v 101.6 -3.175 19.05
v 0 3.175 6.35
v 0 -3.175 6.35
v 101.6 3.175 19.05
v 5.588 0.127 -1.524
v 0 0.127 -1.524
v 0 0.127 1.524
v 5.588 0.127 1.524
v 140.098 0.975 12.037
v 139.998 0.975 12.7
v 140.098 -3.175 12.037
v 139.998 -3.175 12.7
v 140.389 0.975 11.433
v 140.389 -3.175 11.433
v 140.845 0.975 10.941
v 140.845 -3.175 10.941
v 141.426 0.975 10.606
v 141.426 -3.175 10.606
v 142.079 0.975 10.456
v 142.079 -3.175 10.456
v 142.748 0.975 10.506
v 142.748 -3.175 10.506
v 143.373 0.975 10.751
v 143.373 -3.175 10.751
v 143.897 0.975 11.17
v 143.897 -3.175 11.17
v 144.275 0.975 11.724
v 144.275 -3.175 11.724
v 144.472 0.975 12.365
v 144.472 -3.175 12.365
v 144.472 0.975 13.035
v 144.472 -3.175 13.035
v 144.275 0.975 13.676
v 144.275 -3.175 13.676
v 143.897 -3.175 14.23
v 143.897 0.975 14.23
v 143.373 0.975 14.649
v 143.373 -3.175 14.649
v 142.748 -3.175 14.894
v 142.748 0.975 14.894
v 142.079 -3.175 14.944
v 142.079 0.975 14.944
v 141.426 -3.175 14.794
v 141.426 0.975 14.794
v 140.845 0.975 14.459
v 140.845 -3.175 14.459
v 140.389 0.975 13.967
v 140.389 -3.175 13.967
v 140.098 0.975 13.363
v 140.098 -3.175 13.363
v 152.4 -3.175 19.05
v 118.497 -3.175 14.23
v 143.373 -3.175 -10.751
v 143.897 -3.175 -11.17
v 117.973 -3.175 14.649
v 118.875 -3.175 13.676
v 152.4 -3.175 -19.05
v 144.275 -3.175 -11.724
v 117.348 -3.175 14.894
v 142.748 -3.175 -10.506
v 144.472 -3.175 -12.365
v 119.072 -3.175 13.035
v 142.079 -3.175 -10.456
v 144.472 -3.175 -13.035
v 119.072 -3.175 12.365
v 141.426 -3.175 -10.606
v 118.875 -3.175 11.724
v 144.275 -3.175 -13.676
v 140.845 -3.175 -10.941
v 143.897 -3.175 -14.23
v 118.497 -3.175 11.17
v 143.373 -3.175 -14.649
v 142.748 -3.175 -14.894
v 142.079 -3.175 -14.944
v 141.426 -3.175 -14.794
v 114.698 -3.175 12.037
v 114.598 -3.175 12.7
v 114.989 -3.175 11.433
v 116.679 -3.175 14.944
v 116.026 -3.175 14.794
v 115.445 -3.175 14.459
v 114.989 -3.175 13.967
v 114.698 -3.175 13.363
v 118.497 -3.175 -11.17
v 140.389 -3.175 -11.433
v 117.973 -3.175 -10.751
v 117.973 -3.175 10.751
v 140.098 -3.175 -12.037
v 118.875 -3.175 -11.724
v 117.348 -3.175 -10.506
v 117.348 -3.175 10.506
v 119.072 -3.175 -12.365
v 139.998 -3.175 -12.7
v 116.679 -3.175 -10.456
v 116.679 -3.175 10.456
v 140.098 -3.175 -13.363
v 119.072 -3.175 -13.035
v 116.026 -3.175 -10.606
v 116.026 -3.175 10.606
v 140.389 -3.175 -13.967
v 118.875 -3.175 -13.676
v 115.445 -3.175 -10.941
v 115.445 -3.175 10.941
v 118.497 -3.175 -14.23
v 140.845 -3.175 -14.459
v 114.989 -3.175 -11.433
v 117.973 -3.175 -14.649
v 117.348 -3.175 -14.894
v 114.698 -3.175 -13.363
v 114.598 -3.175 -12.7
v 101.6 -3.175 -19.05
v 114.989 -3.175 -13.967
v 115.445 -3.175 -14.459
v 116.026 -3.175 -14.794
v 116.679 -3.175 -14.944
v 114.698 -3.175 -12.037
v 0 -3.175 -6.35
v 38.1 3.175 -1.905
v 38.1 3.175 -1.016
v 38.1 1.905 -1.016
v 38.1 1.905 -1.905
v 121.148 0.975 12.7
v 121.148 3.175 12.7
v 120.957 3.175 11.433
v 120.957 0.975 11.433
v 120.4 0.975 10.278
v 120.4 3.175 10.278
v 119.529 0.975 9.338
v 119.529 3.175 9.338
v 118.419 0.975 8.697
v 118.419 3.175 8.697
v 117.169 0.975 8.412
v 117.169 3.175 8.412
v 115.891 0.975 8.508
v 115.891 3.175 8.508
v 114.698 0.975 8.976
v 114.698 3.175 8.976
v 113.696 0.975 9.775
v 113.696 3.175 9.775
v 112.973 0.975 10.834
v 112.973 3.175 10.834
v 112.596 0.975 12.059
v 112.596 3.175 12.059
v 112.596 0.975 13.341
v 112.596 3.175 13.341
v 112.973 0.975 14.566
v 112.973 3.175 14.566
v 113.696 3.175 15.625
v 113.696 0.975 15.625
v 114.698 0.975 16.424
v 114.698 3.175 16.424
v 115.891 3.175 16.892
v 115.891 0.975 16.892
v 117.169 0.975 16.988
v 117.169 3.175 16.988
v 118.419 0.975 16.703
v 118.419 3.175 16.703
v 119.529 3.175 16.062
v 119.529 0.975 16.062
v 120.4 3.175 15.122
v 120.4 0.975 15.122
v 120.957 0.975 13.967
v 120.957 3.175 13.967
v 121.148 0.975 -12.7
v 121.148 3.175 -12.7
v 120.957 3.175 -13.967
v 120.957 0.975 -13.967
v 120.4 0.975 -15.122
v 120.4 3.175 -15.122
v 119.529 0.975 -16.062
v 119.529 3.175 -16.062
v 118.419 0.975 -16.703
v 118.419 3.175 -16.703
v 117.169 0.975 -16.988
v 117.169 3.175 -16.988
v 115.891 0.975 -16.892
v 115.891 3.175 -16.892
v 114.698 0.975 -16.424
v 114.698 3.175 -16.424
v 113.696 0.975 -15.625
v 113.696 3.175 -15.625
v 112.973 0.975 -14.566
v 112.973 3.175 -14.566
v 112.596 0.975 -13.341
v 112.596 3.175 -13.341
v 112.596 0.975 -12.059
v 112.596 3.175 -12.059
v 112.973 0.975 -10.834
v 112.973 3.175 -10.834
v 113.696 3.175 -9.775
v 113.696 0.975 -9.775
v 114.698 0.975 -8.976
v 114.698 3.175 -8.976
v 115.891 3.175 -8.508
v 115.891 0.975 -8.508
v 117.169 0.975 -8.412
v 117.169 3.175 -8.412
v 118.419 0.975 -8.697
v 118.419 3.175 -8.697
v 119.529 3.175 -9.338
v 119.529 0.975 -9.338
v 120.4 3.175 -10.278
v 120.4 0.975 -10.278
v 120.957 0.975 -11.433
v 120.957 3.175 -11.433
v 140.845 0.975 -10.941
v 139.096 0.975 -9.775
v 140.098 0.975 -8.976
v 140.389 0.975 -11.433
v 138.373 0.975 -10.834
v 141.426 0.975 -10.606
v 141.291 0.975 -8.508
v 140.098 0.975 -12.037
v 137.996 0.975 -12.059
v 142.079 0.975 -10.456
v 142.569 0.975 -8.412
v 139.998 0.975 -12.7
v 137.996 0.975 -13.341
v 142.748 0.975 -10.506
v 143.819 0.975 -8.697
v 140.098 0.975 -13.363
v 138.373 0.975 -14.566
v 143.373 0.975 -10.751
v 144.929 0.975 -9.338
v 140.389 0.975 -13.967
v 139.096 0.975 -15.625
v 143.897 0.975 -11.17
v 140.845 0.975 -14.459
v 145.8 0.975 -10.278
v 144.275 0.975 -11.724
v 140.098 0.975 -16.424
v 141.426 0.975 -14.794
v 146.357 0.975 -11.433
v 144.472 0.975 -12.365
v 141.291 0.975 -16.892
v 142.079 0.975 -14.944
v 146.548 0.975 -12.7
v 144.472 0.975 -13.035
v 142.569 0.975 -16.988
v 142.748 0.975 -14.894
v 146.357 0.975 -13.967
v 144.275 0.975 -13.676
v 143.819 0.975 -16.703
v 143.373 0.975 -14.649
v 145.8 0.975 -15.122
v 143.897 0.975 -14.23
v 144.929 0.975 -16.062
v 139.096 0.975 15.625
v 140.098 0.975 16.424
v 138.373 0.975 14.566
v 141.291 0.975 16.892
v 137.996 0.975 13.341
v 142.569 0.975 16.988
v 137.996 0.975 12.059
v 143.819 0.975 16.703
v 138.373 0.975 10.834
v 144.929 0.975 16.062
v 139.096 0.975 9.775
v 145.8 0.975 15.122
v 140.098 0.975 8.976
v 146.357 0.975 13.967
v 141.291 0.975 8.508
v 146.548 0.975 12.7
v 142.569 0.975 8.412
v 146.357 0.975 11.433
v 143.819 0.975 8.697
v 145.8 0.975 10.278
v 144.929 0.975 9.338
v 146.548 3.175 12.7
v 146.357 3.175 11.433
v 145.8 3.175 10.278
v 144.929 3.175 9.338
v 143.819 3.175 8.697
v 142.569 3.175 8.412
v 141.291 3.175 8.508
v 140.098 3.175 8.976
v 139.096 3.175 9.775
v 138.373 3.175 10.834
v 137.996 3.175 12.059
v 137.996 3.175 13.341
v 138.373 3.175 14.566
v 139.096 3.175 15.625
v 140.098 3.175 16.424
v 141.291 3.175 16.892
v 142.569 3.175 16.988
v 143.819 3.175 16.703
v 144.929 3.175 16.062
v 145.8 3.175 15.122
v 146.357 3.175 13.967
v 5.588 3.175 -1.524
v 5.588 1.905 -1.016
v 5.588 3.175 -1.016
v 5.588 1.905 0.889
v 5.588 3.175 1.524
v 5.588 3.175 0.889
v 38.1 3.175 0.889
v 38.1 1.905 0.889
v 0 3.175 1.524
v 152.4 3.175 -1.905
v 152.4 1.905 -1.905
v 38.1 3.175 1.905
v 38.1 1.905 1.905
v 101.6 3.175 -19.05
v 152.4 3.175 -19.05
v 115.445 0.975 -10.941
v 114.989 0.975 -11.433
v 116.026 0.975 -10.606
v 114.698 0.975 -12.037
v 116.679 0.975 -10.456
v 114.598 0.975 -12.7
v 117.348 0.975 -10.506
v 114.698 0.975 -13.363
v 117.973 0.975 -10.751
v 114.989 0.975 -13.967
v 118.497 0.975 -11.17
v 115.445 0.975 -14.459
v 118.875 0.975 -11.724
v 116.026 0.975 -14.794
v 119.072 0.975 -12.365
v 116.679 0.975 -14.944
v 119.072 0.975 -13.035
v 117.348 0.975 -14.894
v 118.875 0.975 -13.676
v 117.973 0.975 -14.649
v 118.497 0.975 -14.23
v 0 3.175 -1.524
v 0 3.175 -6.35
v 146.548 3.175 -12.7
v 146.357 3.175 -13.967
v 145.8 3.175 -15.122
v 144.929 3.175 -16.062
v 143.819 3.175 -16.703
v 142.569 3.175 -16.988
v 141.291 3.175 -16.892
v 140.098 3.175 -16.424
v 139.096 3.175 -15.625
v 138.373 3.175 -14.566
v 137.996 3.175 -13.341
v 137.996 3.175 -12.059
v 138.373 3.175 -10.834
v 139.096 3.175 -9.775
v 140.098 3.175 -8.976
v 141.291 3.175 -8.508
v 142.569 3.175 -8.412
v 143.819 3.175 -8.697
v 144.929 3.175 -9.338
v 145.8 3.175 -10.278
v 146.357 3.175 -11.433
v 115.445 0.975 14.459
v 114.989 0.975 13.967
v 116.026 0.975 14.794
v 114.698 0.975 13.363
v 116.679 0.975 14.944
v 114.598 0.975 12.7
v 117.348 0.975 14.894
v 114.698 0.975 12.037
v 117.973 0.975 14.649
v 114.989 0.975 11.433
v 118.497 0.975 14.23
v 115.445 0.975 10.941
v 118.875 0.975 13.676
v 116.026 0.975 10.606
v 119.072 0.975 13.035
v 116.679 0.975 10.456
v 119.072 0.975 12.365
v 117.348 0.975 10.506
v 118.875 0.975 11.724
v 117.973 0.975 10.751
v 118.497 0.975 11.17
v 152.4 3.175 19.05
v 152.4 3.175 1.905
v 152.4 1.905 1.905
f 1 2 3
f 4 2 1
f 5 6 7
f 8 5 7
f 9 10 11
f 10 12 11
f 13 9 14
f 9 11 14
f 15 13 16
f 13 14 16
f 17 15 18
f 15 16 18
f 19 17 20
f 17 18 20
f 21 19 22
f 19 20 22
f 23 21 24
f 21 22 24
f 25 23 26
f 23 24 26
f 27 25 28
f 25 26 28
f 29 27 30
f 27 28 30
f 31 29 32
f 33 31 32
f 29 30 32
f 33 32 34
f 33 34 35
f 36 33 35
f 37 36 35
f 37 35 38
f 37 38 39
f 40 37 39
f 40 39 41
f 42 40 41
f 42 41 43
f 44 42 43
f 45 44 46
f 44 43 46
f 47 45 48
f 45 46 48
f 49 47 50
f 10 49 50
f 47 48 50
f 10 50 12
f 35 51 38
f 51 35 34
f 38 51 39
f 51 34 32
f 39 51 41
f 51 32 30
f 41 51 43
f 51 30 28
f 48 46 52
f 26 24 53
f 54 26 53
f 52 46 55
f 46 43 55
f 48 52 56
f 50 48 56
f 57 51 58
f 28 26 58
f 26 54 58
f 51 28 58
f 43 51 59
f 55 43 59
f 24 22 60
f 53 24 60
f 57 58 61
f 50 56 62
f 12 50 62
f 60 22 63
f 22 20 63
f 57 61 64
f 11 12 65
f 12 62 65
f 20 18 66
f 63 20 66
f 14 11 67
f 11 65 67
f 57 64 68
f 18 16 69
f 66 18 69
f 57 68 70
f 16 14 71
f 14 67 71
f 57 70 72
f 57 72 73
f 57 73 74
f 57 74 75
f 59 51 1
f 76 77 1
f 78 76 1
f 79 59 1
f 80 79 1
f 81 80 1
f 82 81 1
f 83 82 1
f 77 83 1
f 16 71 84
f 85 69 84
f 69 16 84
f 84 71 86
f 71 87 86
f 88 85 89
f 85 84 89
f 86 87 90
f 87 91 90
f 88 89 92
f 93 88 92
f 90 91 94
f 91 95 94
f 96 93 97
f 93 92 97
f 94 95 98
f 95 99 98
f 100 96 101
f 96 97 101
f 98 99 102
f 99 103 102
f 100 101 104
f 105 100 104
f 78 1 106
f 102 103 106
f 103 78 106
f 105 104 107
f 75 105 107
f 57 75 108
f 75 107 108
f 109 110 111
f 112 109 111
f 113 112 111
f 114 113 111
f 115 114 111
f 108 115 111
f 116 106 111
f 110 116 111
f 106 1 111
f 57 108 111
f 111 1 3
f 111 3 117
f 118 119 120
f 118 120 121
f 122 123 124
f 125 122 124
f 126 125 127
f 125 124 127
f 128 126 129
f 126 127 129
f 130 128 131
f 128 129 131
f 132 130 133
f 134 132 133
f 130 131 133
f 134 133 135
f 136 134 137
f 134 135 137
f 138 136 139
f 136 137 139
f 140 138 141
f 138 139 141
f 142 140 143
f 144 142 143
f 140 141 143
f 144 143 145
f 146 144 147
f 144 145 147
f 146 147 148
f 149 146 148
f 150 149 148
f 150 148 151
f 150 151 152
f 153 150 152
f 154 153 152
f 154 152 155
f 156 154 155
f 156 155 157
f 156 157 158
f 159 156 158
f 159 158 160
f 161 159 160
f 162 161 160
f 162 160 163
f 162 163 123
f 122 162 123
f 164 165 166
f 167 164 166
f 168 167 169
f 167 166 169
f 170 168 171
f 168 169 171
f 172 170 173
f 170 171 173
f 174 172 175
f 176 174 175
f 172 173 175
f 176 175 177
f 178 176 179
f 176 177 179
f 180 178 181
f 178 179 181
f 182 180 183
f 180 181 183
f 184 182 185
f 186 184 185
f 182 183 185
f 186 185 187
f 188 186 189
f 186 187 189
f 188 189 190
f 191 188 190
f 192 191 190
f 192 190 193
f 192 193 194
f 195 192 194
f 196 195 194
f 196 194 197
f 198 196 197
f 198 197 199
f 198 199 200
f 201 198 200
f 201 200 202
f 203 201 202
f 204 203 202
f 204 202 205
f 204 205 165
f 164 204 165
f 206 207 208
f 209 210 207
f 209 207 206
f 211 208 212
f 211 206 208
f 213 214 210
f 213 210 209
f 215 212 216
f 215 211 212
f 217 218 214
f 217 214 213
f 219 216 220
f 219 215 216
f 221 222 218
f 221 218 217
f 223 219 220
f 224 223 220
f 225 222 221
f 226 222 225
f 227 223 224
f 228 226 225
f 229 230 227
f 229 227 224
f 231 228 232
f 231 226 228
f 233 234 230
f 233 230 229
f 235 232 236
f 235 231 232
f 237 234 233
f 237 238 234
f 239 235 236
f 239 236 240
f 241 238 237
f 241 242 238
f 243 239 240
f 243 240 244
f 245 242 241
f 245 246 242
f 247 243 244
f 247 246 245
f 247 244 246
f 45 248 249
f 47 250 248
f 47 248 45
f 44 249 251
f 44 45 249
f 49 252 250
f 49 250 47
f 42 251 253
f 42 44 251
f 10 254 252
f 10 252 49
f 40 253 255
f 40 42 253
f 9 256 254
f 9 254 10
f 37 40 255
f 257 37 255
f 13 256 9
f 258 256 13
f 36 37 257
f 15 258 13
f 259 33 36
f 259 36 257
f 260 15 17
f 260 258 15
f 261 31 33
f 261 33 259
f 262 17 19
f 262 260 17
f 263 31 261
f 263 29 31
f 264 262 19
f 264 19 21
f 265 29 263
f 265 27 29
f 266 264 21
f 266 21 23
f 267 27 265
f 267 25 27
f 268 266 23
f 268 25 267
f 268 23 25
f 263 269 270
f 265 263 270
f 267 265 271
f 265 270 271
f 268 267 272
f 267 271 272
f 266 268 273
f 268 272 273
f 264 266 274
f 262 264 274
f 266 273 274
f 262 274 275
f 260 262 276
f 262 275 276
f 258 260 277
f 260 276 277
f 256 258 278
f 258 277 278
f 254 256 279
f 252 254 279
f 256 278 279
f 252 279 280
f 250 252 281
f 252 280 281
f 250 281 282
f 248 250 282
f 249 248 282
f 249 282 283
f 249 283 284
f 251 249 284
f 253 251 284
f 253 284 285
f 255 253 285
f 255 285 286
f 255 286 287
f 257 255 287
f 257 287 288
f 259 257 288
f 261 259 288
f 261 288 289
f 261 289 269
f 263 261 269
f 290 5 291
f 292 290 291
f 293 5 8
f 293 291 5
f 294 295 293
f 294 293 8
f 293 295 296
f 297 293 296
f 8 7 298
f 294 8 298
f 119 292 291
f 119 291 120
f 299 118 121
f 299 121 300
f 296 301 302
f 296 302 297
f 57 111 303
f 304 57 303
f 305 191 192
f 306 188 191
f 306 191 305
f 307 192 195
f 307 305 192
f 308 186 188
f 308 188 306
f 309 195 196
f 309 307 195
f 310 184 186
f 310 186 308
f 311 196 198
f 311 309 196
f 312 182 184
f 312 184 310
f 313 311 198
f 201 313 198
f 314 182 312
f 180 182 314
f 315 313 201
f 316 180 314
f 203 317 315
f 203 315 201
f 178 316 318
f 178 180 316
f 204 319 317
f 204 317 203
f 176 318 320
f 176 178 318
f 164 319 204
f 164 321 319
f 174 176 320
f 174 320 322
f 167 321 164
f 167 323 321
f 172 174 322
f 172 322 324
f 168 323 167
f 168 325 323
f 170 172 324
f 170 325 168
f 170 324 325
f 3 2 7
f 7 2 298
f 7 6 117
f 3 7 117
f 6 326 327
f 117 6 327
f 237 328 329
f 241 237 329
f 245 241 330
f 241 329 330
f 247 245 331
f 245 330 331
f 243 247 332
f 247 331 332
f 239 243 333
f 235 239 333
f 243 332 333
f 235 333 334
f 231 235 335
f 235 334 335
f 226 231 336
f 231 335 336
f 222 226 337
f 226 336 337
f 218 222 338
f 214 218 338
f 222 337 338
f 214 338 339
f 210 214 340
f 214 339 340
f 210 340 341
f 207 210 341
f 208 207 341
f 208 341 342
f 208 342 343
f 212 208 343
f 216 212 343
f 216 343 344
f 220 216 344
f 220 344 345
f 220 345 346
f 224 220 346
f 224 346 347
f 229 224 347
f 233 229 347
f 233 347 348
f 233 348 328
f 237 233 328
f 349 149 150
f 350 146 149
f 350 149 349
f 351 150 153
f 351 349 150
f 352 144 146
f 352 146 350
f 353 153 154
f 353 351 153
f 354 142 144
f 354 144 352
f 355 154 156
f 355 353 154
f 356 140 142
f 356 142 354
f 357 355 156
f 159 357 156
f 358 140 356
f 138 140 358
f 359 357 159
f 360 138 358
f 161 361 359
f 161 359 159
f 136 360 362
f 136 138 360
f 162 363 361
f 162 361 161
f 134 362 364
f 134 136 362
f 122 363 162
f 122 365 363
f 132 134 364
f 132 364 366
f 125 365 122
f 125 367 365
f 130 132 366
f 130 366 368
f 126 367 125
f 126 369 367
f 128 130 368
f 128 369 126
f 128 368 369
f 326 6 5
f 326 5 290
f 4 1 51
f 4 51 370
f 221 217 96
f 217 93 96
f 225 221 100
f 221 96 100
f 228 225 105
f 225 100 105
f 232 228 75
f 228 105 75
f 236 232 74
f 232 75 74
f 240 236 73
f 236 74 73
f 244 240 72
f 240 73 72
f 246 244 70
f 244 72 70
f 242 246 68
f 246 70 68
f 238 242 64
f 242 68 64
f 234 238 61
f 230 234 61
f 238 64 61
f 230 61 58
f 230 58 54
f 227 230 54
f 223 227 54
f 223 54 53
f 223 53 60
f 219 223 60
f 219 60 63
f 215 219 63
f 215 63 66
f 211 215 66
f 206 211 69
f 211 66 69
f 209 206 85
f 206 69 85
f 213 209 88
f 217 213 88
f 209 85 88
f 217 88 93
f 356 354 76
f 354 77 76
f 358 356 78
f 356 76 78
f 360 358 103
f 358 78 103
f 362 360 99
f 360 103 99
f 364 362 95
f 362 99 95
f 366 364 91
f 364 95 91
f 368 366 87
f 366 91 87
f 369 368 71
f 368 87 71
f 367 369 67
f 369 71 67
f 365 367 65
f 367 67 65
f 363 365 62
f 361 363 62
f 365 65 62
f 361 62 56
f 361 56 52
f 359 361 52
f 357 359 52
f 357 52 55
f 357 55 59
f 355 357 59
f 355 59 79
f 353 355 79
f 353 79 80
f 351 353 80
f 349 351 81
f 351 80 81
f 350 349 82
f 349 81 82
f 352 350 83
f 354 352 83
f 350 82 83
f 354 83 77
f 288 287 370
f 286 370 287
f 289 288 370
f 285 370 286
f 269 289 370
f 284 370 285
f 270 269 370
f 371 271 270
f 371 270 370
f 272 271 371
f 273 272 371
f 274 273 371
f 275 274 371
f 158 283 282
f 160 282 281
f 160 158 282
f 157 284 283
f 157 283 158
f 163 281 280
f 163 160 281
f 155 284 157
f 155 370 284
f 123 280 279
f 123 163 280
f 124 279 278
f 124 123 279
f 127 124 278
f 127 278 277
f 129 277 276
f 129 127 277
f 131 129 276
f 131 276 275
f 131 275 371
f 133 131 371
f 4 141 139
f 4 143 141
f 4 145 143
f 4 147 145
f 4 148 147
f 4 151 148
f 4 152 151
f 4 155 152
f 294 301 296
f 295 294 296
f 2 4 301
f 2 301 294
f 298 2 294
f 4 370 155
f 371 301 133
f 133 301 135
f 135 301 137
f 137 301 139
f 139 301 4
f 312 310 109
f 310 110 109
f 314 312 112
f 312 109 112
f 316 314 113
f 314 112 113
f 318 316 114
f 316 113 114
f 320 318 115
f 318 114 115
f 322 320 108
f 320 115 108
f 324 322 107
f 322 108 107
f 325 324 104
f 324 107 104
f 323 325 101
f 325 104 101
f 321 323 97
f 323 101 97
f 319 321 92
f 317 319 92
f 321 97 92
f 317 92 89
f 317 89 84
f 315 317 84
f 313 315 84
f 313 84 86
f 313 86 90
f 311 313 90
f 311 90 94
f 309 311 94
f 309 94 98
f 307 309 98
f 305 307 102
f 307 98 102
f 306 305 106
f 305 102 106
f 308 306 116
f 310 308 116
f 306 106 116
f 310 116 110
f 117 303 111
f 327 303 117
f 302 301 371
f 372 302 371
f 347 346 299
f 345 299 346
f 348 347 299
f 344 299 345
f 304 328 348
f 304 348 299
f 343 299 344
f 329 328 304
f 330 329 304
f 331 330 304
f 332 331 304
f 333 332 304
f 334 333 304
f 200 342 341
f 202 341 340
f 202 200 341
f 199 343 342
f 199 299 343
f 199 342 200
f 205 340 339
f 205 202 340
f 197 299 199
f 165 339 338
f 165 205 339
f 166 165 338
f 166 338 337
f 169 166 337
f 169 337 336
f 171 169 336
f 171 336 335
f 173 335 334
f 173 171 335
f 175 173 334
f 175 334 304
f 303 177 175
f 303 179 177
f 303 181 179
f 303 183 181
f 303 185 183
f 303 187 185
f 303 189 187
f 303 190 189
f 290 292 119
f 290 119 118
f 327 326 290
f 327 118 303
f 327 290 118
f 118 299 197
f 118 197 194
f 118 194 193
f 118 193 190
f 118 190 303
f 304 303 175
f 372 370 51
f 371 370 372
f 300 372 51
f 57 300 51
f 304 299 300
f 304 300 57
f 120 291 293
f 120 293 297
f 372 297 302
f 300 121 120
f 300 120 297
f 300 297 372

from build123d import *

# Parameters (mm, degrees)
SKETCH2_W                       = 38.1
SKETCH2_H                       = 6.35
BOSS_EXTRUDE1_DEPTH             = 152.4
CBORE_FOR_M4_SBHCS1_D           = 4.5
CBORE_FOR_M4_SBHCS1_CBORE_D     = 8.6
CBORE_FOR_M4_SBHCS1_CBORE_DEPTH = 2.2
SKETCH9_W                       = 3.048
SKETCH9_H                       = 3.048
CUT_EXTRUDE1_DEPTH              = 5.588
SKETCH12_W                      = 114.3
SKETCH12_H                      = 3.81
CUT_EXTRUDE2_DEPTH              = 1.27
SKETCH13_W                      = 32.512
SKETCH13_H                      = 1.905
CUT_EXTRUDE3_DEPTH              = 1.27
CUT_EXTRUDE4_DEPTH              = 6.35
CUT_EXTRUDE5_DEPTH              = 6.35


with BuildPart() as part:
    # Sketch2 → Boss-Extrude1 (new body)
    with BuildSketch(Plane(origin=(0, 0, 0), x_dir=(0, 0, -1), z_dir=(1, 0, 0))):
        Rectangle(SKETCH2_W, SKETCH2_H)
    extrude(amount=BOSS_EXTRUDE1_DEPTH)

    # CBORE for M4 SBHCS1 (through all)
    with Locations(Plane(origin=(0, 3.175, 0), x_dir=(1, 0, 0), z_dir=(0, 1, 0))):
        with Locations((142.247626007, -12.7), (142.247626007, 12.7), (116.847626007, 12.7), (116.847626007, -12.7)):
            CounterBoreHole(CBORE_FOR_M4_SBHCS1_D / 2, CBORE_FOR_M4_SBHCS1_CBORE_D / 2, CBORE_FOR_M4_SBHCS1_CBORE_DEPTH)

    # Sketch9 → Cut-Extrude1 (cut)
    with BuildSketch(Plane.ZY):
        with Locations((0, 1.651)):
            Rectangle(SKETCH9_W, SKETCH9_H)
    extrude(amount=-CUT_EXTRUDE1_DEPTH, mode=Mode.SUBTRACT)

    # Sketch12 → Cut-Extrude2 (cut)
    with BuildSketch(Plane(origin=(0, 3.175, 0), x_dir=(1, 0, 0), z_dir=(0, 1, 0))):
        with Locations((95.25, 0)):
            Rectangle(SKETCH12_W, SKETCH12_H)
    extrude(amount=-CUT_EXTRUDE2_DEPTH, mode=Mode.SUBTRACT)

    # Sketch13 → Cut-Extrude3 (cut)
    with BuildSketch(Plane(origin=(0, 3.175, 0), x_dir=(1, 0, 0), z_dir=(0, 1, 0))):
        with Locations((21.844, 0.0635)):
            Rectangle(SKETCH13_W, SKETCH13_H)
    extrude(amount=-CUT_EXTRUDE3_DEPTH, mode=Mode.SUBTRACT)

    # Sketch14 → Cut-Extrude4 (cut)
    with BuildSketch(Plane(origin=(0, 3.175, 0), x_dir=(1, 0, 0), z_dir=(0, 1, 0))):
        Polygon((0, 6.35), (0, 19.05), (101.6, 19.05), align=None)
    extrude(amount=-CUT_EXTRUDE4_DEPTH, mode=Mode.SUBTRACT)

    # Sketch15 → Cut-Extrude5 (cut)
    with BuildSketch(Plane(origin=(0, 3.175, 0), x_dir=(1, 0, 0), z_dir=(0, 1, 0))):
        Polygon((0, -6.35), (101.6, -19.05), (0, -19.05), align=None)
    extrude(amount=-CUT_EXTRUDE5_DEPTH, mode=Mode.SUBTRACT)


solid = part.part
